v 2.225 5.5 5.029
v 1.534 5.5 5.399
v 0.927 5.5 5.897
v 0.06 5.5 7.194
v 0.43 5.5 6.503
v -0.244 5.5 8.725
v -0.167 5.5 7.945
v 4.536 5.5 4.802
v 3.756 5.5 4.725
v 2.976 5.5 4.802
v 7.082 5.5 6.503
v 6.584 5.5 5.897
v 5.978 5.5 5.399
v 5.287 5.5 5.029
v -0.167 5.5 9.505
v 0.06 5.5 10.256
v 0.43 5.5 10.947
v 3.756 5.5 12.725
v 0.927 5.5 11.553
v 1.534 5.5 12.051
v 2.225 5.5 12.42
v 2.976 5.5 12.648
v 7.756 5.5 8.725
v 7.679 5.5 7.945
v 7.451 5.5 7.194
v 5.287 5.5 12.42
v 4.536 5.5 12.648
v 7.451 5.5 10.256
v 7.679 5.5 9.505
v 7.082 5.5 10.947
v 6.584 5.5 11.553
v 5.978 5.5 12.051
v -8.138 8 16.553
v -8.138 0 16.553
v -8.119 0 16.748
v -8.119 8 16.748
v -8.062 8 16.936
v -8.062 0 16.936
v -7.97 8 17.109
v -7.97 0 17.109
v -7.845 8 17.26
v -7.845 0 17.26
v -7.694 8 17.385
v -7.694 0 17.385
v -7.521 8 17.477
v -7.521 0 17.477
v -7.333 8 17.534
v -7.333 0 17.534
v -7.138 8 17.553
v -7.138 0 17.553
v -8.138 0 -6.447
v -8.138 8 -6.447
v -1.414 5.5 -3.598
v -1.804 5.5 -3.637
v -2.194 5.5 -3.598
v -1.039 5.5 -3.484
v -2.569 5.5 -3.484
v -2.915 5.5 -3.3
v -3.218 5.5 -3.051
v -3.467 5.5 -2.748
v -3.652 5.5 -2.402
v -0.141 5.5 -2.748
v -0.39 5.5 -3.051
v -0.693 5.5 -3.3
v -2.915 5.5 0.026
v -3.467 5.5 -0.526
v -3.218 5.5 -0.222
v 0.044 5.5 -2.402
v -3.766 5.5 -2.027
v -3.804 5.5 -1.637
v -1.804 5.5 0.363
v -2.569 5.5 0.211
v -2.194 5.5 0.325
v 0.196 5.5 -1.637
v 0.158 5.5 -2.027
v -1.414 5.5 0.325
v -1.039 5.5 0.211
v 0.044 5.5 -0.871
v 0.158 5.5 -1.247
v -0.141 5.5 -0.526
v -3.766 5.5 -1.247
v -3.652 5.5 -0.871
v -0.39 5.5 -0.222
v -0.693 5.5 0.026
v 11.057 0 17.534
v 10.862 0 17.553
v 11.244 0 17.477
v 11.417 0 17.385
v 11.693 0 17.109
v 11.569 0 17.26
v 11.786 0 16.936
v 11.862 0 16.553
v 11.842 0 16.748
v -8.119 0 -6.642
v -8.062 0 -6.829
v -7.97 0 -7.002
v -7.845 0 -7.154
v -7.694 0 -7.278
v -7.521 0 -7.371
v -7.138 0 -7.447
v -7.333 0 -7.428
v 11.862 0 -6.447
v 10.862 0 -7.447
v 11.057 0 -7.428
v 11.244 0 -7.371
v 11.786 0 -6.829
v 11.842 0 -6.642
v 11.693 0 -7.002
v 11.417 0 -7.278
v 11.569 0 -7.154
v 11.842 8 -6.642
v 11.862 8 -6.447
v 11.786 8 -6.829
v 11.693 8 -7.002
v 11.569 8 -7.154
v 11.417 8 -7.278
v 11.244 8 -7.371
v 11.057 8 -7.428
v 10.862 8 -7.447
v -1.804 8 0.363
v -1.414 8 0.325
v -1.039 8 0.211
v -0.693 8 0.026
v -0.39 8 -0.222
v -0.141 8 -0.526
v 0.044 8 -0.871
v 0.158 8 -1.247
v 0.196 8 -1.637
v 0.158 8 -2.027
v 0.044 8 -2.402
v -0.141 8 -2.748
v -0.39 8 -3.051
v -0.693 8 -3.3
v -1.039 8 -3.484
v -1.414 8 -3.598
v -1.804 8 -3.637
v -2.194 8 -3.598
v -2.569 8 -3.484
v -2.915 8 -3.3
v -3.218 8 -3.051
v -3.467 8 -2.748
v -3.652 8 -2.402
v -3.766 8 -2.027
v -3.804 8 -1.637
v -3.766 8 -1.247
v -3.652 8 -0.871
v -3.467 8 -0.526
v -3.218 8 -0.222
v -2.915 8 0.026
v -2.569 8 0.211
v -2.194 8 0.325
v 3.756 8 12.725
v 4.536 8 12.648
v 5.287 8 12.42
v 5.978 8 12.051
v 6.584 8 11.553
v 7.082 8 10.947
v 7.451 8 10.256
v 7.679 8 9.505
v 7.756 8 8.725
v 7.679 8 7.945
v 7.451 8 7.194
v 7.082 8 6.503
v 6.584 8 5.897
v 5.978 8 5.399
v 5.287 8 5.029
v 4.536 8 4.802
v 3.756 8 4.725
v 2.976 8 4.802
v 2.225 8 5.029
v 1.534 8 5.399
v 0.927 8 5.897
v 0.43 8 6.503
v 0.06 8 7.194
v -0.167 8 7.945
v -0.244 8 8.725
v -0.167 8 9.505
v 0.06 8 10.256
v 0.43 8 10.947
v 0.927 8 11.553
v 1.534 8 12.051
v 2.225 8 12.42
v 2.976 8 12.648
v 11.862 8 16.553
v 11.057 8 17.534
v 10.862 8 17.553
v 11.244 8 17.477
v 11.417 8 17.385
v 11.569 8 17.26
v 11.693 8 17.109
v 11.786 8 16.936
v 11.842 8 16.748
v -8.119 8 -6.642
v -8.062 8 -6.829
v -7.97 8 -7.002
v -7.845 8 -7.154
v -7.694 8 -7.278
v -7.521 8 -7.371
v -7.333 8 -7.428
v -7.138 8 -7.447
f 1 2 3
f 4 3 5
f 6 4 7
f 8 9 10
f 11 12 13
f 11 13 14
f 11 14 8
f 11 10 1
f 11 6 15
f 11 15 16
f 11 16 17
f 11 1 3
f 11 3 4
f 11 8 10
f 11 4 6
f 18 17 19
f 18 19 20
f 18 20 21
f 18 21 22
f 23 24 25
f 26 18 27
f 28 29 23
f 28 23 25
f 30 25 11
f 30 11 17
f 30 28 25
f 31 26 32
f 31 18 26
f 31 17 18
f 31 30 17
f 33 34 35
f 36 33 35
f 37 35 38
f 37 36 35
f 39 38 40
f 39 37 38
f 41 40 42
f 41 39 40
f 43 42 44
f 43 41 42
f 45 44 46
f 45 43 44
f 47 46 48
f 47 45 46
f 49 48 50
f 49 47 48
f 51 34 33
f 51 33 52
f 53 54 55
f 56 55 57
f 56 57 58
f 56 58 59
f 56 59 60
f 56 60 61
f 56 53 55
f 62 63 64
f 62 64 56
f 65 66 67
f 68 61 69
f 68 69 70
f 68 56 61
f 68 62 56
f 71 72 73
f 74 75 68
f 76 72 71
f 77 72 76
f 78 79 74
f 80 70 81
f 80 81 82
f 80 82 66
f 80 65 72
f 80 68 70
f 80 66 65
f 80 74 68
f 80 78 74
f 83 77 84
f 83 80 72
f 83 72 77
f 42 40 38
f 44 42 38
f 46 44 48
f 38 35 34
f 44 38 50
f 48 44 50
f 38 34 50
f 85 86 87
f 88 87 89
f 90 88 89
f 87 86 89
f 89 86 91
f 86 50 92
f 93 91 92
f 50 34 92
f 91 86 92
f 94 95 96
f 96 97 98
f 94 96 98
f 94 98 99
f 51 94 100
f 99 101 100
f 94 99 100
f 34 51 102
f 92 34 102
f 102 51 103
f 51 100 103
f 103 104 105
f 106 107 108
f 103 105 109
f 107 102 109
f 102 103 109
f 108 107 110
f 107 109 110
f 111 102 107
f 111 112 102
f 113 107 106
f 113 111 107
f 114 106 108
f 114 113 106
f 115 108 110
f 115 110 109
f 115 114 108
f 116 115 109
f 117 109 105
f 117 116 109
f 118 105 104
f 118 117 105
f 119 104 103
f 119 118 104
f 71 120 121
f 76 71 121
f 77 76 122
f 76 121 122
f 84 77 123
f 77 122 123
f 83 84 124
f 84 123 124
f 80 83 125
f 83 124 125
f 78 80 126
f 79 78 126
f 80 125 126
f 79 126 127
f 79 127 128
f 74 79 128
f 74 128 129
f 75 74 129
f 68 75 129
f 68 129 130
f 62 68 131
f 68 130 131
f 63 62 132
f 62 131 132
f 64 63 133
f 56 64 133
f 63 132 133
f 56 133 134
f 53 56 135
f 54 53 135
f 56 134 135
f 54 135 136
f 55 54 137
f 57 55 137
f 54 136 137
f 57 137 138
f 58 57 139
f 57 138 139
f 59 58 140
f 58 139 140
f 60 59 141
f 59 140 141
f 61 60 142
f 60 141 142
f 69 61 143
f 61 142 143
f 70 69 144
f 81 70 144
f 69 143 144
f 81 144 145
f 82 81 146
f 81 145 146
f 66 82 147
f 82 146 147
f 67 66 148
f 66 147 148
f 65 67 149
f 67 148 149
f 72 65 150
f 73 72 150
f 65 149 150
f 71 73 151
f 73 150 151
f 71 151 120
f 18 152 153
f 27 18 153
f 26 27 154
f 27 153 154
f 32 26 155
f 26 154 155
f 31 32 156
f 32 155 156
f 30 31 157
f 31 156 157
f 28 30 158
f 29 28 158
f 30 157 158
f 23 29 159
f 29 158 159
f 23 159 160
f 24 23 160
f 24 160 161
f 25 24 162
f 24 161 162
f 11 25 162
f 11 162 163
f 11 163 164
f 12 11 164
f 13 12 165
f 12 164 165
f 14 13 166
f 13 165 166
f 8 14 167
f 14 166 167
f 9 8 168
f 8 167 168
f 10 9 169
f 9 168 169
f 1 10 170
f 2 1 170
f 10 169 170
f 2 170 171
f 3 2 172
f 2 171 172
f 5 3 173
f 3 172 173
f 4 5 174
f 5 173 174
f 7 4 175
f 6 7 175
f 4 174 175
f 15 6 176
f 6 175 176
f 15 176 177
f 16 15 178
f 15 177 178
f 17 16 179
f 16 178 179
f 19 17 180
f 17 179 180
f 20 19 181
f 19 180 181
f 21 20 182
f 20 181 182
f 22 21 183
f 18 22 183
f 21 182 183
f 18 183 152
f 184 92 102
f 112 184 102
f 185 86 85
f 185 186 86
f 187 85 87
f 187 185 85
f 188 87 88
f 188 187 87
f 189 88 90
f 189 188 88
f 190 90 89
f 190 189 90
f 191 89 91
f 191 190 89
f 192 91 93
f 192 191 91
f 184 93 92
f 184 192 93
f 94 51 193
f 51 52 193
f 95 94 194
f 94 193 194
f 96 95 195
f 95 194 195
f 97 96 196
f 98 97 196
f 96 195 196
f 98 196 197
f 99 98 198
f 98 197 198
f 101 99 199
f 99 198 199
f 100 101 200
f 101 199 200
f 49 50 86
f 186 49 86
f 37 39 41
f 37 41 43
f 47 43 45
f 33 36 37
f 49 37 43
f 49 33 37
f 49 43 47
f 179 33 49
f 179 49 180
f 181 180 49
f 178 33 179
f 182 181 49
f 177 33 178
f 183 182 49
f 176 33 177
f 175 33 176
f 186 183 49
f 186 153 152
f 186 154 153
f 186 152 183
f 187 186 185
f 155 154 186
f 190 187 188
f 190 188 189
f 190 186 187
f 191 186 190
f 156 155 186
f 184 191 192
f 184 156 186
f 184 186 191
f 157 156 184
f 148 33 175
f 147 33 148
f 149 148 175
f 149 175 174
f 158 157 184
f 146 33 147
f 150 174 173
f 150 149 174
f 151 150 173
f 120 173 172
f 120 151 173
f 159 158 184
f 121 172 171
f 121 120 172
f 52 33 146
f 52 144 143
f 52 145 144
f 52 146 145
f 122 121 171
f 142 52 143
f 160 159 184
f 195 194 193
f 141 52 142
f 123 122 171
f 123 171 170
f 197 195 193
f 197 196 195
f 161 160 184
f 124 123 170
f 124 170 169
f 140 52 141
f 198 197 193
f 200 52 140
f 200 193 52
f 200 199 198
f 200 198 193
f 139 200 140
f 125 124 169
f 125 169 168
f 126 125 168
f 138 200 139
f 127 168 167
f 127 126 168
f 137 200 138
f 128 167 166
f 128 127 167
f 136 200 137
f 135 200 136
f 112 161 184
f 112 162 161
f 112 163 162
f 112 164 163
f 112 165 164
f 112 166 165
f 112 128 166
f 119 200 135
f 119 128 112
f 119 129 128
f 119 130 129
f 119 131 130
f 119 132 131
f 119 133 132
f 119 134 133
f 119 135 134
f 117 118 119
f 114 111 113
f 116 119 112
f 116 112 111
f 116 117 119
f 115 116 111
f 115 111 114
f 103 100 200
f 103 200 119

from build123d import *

# Parameters (mm, degrees)
SKETCH1_W           = 20
SKETCH1_H           = 25
BOSS_EXTRUDE1_DEPTH = 8
FILLET1_R           = 1
SKETCH4_R           = 2
SKETCH4_R_2         = 4
CUT_EXTRUDE1_DEPTH  = 2.5


with BuildPart() as part:
    # Sketch1 → Boss-Extrude1 (new body)
    with BuildSketch(Plane(origin=(0, 0, 0), x_dir=(1, 0, 0), z_dir=(0, 1, 0))):
        with Locations((1.861702128, -5.053191489)):
            Rectangle(SKETCH1_W, SKETCH1_H)
    extrude(amount=BOSS_EXTRUDE1_DEPTH)

    # Fillet1
    fillet1_edges = [part.edges().sort_by_distance(p)[0] for p in [
        (-8.138297872, 4, -7.446808511),
        (-8.138297872, 4, 17.553191489),
        (11.861702128, 4, 17.553191489),
        (11.861702128, 4, -7.446808511),
    ]]
    fillet(fillet1_edges, radius=FILLET1_R)

    # Sketch4 → Cut-Extrude1 (cut)
    with BuildSketch(Plane(origin=(0, 8, 0), x_dir=(1, 0, 0), z_dir=(0, 1, 0))):
        with Locations(Location((-1.804003479, 1.636713319, 0), (0, 0, 270))):
            Circle(SKETCH4_R)
        with Locations(Location((3.755918293, -8.724959073, 0), (0, 0, 270))):
            Circle(SKETCH4_R_2)
    extrude(amount=-CUT_EXTRUDE1_DEPTH, mode=Mode.SUBTRACT)


solid = part.part
